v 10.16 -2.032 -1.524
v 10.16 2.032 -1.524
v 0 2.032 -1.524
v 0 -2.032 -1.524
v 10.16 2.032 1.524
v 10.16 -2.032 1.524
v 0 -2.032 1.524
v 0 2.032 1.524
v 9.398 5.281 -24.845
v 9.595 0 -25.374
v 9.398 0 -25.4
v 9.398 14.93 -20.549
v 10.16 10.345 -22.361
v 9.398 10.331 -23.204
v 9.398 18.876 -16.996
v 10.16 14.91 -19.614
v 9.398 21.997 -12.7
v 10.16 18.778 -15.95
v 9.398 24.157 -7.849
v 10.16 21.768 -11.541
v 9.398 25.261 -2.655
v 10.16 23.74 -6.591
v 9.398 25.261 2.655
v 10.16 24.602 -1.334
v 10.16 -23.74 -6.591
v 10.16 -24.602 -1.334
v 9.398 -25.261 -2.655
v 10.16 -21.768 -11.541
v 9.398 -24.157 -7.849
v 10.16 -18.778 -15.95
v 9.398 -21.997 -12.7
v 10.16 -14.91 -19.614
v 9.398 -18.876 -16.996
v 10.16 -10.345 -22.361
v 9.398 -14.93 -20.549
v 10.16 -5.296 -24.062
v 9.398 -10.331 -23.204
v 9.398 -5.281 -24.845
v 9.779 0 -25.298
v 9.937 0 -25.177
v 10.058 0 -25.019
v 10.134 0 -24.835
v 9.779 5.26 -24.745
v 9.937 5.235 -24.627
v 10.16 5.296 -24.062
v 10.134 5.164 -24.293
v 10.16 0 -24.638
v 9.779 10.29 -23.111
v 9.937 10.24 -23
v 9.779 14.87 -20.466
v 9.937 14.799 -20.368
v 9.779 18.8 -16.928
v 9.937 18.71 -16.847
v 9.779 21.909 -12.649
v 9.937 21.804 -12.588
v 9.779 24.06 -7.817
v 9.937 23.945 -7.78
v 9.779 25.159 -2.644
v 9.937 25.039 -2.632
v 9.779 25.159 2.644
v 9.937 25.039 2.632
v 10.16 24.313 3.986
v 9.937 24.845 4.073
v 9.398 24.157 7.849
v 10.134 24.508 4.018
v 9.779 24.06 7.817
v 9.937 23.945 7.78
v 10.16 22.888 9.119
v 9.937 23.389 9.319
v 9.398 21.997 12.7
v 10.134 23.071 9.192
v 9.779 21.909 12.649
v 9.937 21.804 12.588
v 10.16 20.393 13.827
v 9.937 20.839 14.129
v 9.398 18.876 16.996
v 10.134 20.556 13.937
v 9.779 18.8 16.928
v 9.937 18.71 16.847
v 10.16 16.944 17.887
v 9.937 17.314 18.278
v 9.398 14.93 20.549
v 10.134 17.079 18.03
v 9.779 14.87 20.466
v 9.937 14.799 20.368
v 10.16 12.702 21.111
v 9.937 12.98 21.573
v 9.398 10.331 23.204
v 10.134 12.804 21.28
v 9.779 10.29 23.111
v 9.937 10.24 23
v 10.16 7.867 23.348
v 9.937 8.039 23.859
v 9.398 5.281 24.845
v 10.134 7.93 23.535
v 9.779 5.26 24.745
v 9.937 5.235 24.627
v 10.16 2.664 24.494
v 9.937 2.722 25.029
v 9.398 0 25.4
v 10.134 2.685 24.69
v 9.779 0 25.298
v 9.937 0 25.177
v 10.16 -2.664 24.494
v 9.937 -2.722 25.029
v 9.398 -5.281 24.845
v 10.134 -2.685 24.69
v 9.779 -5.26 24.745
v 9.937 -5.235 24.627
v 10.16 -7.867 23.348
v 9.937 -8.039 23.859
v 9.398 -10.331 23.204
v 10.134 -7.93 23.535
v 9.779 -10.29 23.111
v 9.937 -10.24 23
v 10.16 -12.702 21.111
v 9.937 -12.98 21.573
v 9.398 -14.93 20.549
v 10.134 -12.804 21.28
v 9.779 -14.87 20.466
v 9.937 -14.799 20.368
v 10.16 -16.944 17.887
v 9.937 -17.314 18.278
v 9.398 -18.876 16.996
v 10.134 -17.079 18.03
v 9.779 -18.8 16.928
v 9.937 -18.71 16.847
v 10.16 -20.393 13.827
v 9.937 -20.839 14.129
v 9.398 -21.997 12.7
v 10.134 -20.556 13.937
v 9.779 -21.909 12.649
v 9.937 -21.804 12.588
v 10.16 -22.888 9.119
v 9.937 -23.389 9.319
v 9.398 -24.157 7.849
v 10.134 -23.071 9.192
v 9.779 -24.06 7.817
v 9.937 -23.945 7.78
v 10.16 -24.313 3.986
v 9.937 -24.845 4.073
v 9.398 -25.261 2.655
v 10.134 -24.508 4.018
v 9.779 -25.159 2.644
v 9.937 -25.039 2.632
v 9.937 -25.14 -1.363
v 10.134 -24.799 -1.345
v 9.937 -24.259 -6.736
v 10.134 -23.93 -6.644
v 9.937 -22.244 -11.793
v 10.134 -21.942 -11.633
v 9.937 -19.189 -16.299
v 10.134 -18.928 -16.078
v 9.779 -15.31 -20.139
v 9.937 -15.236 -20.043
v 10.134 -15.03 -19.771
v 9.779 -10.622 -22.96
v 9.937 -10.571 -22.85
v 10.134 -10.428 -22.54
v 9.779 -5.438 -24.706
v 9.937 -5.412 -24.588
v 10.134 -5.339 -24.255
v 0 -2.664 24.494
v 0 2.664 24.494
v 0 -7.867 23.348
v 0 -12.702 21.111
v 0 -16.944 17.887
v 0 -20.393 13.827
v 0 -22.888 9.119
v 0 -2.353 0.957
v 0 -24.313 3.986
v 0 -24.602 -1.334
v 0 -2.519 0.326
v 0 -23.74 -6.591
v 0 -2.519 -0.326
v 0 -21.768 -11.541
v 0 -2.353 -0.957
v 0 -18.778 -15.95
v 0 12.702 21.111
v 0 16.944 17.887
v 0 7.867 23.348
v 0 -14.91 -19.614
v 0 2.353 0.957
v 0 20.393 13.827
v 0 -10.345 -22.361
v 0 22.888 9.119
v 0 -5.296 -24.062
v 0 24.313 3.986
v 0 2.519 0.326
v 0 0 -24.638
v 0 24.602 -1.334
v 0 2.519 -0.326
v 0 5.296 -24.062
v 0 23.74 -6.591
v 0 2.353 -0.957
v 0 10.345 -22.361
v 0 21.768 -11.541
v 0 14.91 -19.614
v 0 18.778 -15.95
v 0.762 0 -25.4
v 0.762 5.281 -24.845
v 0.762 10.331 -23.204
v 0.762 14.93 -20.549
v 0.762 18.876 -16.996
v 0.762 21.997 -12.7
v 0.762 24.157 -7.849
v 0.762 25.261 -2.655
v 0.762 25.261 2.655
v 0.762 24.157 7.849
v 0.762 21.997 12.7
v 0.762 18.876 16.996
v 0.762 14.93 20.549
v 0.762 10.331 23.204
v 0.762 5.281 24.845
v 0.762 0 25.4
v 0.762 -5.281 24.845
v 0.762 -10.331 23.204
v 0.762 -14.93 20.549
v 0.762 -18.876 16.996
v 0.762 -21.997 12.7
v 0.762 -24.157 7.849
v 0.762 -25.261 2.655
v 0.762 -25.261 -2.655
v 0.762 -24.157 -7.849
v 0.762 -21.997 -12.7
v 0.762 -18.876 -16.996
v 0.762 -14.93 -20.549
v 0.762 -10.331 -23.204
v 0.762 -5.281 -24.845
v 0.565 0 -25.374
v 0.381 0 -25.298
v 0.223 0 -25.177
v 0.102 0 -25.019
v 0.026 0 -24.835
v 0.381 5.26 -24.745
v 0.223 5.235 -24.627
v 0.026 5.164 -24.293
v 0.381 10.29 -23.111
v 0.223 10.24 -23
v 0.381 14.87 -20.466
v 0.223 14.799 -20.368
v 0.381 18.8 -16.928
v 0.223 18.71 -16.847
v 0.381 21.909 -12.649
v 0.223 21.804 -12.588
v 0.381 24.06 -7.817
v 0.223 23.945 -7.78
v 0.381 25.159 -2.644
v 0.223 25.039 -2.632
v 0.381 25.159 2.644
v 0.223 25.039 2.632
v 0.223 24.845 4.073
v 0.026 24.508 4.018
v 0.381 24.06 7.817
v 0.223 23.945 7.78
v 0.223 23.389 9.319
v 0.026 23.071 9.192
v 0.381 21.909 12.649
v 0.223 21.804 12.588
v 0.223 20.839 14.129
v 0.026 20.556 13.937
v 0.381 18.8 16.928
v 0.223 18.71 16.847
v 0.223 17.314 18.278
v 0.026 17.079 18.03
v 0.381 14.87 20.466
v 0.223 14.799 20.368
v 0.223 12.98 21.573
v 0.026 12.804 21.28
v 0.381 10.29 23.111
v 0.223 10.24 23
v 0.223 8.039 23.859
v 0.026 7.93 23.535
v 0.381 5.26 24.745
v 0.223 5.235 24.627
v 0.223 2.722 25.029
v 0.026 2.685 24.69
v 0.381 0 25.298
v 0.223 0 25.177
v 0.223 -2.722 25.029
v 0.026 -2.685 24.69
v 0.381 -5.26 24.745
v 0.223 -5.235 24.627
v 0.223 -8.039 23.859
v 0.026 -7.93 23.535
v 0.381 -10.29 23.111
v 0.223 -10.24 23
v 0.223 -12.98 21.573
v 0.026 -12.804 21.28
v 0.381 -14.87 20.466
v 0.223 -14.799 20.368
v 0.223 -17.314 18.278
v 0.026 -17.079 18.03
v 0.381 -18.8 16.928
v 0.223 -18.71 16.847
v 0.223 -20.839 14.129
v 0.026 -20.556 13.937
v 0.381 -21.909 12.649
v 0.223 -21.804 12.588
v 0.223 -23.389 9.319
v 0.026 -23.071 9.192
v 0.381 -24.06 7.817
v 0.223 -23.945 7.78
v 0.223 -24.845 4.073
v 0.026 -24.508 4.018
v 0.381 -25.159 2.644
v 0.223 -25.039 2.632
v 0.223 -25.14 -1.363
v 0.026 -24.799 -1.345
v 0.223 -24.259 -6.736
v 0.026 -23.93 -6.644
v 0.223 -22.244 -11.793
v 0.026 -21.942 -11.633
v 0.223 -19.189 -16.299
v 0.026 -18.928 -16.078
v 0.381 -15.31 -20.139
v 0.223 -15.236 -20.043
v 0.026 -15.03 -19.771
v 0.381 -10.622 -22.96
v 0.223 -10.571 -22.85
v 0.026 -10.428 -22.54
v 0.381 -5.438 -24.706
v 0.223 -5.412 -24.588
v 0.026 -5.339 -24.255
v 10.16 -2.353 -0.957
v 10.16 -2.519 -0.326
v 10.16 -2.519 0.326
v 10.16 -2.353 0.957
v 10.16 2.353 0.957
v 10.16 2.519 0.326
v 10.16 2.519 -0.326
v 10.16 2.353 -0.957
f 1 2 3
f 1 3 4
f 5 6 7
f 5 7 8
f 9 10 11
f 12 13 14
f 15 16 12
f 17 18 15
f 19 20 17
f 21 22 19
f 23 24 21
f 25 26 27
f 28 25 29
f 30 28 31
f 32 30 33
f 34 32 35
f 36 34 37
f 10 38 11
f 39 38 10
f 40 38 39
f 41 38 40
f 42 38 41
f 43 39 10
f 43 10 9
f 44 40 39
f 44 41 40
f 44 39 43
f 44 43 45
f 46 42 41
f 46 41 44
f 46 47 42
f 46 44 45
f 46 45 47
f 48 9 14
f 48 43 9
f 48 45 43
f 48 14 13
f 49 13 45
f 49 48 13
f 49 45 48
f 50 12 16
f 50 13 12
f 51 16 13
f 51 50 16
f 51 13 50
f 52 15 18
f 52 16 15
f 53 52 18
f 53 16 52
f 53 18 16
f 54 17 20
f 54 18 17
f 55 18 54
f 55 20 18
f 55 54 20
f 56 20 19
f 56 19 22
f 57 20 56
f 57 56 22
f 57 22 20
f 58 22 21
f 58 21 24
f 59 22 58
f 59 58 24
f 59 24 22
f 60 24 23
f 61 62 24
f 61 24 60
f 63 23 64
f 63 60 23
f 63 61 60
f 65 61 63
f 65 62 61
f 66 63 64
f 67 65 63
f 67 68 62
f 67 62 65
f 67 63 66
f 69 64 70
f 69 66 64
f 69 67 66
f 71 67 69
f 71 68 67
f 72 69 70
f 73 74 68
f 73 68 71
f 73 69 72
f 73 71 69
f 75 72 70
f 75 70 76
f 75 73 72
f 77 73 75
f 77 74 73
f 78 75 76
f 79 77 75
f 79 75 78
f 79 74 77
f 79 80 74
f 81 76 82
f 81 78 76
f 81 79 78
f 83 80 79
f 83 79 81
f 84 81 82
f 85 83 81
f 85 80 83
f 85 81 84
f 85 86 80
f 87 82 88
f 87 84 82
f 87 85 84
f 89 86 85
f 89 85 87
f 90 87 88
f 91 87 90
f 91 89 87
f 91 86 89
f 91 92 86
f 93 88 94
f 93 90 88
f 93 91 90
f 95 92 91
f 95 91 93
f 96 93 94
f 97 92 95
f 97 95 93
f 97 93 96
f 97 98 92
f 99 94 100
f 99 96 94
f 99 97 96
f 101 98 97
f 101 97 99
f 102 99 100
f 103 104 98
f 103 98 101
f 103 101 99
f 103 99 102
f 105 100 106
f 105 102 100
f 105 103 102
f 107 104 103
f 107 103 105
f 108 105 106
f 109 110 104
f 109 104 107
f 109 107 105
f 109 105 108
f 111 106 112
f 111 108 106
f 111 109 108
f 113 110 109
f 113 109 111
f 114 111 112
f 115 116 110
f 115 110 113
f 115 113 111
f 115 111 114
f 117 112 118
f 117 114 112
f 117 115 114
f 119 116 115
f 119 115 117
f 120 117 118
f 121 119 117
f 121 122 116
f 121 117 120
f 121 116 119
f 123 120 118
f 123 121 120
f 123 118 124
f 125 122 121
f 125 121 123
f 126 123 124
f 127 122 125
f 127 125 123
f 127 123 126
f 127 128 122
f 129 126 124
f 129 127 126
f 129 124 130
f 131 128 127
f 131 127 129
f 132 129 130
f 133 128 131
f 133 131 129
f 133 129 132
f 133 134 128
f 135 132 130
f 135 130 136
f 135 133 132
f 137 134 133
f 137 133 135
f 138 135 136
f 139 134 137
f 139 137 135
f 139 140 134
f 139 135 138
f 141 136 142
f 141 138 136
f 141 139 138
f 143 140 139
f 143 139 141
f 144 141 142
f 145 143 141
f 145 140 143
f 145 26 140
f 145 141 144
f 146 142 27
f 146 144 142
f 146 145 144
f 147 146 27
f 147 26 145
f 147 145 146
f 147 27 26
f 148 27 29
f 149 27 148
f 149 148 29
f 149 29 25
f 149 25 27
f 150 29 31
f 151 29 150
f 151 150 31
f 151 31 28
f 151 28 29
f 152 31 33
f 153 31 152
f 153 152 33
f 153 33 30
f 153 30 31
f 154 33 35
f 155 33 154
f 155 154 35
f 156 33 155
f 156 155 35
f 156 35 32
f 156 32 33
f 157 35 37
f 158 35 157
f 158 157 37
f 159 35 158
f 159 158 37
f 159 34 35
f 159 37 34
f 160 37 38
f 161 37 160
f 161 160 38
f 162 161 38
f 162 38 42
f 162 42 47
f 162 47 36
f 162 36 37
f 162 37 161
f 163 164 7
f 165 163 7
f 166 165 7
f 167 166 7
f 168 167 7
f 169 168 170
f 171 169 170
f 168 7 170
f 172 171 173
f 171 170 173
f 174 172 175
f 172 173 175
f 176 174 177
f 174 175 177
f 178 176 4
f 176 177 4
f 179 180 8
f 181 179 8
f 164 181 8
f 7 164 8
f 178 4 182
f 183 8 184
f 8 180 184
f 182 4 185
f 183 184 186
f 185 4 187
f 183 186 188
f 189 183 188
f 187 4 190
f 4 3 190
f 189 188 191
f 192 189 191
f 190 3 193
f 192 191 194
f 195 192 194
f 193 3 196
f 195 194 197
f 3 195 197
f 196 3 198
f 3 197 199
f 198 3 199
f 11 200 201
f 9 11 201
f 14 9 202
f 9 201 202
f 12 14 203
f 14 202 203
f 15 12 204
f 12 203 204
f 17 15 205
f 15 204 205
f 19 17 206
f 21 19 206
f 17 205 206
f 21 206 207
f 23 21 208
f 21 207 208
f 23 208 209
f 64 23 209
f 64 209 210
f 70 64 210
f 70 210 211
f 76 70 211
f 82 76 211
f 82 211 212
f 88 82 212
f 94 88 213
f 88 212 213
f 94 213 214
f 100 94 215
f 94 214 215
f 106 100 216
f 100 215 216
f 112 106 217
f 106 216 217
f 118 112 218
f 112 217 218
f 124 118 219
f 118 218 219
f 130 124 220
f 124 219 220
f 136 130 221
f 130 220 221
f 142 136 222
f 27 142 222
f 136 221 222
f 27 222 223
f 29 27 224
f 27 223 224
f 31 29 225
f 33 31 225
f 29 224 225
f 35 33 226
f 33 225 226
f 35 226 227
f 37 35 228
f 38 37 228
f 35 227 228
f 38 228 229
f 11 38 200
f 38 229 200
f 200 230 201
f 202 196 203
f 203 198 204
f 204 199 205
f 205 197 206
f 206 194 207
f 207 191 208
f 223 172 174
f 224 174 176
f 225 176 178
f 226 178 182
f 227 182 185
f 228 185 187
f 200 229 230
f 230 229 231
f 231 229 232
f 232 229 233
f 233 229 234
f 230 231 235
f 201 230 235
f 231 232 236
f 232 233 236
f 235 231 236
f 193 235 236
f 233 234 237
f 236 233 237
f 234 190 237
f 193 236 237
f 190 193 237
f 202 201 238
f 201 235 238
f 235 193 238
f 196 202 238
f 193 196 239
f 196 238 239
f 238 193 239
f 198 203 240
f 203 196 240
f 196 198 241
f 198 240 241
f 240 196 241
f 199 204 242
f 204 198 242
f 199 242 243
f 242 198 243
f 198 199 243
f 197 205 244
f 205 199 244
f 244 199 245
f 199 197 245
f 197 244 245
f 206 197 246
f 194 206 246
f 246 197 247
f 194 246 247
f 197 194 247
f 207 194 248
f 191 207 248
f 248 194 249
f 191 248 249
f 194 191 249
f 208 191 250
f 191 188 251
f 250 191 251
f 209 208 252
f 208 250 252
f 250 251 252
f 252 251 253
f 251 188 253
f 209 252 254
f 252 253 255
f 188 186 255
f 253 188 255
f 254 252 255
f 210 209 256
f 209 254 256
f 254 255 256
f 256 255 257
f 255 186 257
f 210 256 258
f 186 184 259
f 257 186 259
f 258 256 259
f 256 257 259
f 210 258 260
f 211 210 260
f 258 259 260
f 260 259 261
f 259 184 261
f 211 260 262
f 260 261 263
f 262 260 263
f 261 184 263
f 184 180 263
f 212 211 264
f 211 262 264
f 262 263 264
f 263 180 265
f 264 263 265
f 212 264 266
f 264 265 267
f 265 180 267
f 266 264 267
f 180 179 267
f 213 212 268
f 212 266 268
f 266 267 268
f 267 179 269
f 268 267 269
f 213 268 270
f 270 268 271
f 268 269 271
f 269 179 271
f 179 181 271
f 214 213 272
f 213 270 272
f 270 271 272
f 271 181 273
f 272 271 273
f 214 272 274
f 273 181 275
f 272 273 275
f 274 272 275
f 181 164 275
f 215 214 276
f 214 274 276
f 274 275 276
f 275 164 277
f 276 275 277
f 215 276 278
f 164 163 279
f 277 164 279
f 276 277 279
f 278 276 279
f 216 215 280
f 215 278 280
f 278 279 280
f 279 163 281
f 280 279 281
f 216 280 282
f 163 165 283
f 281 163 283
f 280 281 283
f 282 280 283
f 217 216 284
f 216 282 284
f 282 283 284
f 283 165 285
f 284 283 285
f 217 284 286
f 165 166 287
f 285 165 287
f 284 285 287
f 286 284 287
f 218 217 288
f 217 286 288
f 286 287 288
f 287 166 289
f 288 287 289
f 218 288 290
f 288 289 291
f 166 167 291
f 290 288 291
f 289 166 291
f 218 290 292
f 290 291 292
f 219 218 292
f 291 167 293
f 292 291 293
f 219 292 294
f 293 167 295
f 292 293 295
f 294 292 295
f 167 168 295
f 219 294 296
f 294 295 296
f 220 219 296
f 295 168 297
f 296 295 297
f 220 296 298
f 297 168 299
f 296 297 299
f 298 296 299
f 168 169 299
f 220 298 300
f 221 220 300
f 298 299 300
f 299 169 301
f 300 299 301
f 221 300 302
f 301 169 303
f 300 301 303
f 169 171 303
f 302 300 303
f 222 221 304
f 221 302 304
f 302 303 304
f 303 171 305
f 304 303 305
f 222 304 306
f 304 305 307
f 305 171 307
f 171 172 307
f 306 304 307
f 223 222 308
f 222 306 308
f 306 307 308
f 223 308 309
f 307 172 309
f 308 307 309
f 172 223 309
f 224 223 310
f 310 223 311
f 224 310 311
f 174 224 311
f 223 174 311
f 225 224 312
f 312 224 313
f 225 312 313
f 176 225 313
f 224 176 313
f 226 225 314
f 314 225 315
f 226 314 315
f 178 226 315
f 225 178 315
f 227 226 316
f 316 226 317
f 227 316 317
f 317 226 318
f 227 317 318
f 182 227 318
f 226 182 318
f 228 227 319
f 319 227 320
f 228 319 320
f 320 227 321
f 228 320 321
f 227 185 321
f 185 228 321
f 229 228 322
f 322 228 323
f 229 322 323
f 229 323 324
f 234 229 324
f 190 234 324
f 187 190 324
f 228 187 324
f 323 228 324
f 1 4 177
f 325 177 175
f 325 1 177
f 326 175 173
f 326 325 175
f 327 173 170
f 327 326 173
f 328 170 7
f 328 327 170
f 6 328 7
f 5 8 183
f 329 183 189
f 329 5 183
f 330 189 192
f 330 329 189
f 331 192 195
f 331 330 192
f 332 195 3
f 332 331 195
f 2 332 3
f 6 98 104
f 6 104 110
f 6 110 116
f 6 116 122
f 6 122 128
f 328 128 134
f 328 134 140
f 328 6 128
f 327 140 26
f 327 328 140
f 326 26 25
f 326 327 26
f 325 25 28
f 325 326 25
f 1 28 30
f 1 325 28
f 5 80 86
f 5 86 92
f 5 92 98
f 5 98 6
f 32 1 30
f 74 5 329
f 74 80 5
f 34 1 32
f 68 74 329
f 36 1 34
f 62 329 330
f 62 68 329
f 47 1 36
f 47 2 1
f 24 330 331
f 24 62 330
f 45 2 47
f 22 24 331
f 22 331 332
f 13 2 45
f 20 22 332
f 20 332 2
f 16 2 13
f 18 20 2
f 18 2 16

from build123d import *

# Parameters (mm, degrees)
SKETCH1_R           = 25.4
BOSS_EXTRUDE1_DEPTH = 10.16
FILLET1_R           = 0.762
CUT_EXTRUDE1_DEPTH  = 11.16


with BuildPart() as part:
    # Sketch1 → Boss-Extrude1 (new body)
    with BuildSketch(Plane(origin=(0, 0, 0), x_dir=(0, 0, -1), z_dir=(1, 0, 0))):
        Circle(SKETCH1_R)
    extrude(amount=BOSS_EXTRUDE1_DEPTH)

    # Fillet1
    fillet1_edges = [part.edges().sort_by_distance(p)[0] for p in [
        (0, 0, 25.4),
        (10.16, 0, 25.4),
    ]]
    fillet(fillet1_edges, radius=FILLET1_R)

    # Sketch2 → Cut-Extrude1 (cut, through all)
    with BuildSketch(Plane(origin=(10.16, 0, 0), x_dir=(0, 0, -1), z_dir=(1, 0, 0))):
        with BuildLine():
            Line((-1.524, -2.032), (-1.524, 2.032))
            ThreePointArc((-1.524, 2.032), (0, 2.54), (1.524, 2.032))
            Line((1.524, 2.032), (1.524, -2.032))
            ThreePointArc((1.524, -2.032), (0, -2.54), (-1.524, -2.032))
        make_face()
    extrude(amount=-CUT_EXTRUDE1_DEPTH, mode=Mode.SUBTRACT)


solid = part.part
